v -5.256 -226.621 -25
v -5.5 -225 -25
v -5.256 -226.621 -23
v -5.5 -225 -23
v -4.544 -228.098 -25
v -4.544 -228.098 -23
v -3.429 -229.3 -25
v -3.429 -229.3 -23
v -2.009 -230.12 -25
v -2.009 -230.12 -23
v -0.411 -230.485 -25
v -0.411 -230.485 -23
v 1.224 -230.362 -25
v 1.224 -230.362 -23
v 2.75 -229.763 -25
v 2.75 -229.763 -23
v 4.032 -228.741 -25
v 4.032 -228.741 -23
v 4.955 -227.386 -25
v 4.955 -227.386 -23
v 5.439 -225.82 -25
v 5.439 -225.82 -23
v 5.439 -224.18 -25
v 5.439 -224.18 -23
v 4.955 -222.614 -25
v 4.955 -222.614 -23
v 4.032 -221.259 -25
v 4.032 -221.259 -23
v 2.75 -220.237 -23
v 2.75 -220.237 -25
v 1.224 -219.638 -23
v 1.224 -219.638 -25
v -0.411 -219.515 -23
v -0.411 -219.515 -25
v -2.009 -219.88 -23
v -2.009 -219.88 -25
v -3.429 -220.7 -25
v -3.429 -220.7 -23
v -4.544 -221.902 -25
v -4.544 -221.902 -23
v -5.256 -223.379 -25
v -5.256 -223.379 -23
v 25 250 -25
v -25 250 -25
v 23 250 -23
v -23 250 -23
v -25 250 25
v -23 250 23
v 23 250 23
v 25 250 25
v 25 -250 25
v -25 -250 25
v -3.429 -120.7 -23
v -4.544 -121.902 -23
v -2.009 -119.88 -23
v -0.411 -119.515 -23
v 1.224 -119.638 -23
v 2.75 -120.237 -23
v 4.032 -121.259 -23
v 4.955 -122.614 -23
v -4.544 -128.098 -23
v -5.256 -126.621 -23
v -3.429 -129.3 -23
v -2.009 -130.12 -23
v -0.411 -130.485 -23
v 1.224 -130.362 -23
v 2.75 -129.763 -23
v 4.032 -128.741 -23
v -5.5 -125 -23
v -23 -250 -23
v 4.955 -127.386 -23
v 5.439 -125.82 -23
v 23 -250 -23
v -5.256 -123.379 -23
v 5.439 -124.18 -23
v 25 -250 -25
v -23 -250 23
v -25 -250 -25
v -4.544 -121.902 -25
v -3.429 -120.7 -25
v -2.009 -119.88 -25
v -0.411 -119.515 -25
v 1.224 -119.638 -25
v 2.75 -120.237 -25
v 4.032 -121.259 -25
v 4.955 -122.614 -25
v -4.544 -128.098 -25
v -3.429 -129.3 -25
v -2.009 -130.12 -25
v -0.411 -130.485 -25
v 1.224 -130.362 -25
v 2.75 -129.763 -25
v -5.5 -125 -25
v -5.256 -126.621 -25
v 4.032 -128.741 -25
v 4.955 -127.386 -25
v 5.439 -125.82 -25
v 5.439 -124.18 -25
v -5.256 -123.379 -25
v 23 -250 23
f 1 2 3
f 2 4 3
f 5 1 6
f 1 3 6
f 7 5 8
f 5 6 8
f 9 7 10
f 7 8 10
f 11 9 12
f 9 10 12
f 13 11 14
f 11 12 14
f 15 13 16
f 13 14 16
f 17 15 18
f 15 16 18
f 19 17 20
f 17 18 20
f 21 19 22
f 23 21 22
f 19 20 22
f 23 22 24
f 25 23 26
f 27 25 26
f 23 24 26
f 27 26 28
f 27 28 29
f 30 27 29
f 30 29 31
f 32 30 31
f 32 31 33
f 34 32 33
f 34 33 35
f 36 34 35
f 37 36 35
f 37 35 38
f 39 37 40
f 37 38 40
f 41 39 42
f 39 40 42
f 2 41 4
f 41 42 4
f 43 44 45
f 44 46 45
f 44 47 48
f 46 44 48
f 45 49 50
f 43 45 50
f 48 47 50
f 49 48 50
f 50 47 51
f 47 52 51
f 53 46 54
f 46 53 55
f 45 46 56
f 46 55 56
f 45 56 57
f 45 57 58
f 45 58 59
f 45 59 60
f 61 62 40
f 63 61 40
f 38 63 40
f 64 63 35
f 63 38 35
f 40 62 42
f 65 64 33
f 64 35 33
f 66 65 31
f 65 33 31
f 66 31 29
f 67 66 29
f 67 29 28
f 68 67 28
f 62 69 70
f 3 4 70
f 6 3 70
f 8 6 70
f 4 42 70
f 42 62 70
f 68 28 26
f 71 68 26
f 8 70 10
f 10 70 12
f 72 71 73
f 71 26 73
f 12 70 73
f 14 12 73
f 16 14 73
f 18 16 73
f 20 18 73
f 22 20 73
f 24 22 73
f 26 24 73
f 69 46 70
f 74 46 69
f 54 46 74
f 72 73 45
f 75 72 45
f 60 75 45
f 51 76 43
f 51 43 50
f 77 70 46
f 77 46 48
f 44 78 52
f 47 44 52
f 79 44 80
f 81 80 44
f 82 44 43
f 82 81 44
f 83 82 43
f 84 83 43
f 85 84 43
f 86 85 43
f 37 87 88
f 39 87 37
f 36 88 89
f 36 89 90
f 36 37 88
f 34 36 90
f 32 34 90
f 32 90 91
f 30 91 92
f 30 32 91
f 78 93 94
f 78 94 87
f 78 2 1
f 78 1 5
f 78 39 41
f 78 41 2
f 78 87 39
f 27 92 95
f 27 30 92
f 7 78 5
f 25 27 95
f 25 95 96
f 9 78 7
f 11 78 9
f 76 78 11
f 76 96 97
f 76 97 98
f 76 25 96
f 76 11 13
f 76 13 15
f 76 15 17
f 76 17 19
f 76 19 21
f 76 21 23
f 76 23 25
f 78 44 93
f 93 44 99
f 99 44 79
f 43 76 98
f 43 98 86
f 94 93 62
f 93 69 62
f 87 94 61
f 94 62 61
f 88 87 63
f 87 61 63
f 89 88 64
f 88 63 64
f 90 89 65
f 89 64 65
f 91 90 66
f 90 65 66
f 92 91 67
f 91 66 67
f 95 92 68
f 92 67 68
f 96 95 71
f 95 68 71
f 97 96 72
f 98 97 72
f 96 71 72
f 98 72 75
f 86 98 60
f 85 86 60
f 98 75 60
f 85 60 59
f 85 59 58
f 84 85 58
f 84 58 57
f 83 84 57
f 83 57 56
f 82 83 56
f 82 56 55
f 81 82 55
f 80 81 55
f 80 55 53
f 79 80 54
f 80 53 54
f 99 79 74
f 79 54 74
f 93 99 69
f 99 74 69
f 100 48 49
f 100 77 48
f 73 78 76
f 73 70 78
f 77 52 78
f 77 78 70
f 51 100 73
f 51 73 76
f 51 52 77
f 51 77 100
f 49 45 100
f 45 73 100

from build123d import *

# Parameters (mm, degrees)
F0_W     = 50
F0_H     = 50
F0_W_2   = 46
F0_H_2   = 46
F1_DEPTH = 250
F3_D     = 11
F3_DEPTH = 2
F3_TIP   = 3.3047334047


with BuildPart() as f1:
    # F0 (on Front) → F1 (new body, symmetric)
    with BuildSketch(Plane.XZ):
        Rectangle(F0_W, F0_H)
        Rectangle(F0_W_2, F0_H_2, mode=Mode.SUBTRACT)
    extrude(amount=F1_DEPTH, both=True)

    # F3
    with Locations(Plane(origin=(0, 0, -25), x_dir=(1, 0, 0), z_dir=(0, 0, -1))):
        with Locations((0, 225), (0, 125)):
            Hole(F3_D / 2, depth=F3_DEPTH)
            with Locations((0, 0, -(F3_DEPTH + F3_TIP / 2))):  # 118° drill point
                Cone(0, F3_D / 2, F3_TIP, mode=Mode.SUBTRACT)


solid = f1.part
